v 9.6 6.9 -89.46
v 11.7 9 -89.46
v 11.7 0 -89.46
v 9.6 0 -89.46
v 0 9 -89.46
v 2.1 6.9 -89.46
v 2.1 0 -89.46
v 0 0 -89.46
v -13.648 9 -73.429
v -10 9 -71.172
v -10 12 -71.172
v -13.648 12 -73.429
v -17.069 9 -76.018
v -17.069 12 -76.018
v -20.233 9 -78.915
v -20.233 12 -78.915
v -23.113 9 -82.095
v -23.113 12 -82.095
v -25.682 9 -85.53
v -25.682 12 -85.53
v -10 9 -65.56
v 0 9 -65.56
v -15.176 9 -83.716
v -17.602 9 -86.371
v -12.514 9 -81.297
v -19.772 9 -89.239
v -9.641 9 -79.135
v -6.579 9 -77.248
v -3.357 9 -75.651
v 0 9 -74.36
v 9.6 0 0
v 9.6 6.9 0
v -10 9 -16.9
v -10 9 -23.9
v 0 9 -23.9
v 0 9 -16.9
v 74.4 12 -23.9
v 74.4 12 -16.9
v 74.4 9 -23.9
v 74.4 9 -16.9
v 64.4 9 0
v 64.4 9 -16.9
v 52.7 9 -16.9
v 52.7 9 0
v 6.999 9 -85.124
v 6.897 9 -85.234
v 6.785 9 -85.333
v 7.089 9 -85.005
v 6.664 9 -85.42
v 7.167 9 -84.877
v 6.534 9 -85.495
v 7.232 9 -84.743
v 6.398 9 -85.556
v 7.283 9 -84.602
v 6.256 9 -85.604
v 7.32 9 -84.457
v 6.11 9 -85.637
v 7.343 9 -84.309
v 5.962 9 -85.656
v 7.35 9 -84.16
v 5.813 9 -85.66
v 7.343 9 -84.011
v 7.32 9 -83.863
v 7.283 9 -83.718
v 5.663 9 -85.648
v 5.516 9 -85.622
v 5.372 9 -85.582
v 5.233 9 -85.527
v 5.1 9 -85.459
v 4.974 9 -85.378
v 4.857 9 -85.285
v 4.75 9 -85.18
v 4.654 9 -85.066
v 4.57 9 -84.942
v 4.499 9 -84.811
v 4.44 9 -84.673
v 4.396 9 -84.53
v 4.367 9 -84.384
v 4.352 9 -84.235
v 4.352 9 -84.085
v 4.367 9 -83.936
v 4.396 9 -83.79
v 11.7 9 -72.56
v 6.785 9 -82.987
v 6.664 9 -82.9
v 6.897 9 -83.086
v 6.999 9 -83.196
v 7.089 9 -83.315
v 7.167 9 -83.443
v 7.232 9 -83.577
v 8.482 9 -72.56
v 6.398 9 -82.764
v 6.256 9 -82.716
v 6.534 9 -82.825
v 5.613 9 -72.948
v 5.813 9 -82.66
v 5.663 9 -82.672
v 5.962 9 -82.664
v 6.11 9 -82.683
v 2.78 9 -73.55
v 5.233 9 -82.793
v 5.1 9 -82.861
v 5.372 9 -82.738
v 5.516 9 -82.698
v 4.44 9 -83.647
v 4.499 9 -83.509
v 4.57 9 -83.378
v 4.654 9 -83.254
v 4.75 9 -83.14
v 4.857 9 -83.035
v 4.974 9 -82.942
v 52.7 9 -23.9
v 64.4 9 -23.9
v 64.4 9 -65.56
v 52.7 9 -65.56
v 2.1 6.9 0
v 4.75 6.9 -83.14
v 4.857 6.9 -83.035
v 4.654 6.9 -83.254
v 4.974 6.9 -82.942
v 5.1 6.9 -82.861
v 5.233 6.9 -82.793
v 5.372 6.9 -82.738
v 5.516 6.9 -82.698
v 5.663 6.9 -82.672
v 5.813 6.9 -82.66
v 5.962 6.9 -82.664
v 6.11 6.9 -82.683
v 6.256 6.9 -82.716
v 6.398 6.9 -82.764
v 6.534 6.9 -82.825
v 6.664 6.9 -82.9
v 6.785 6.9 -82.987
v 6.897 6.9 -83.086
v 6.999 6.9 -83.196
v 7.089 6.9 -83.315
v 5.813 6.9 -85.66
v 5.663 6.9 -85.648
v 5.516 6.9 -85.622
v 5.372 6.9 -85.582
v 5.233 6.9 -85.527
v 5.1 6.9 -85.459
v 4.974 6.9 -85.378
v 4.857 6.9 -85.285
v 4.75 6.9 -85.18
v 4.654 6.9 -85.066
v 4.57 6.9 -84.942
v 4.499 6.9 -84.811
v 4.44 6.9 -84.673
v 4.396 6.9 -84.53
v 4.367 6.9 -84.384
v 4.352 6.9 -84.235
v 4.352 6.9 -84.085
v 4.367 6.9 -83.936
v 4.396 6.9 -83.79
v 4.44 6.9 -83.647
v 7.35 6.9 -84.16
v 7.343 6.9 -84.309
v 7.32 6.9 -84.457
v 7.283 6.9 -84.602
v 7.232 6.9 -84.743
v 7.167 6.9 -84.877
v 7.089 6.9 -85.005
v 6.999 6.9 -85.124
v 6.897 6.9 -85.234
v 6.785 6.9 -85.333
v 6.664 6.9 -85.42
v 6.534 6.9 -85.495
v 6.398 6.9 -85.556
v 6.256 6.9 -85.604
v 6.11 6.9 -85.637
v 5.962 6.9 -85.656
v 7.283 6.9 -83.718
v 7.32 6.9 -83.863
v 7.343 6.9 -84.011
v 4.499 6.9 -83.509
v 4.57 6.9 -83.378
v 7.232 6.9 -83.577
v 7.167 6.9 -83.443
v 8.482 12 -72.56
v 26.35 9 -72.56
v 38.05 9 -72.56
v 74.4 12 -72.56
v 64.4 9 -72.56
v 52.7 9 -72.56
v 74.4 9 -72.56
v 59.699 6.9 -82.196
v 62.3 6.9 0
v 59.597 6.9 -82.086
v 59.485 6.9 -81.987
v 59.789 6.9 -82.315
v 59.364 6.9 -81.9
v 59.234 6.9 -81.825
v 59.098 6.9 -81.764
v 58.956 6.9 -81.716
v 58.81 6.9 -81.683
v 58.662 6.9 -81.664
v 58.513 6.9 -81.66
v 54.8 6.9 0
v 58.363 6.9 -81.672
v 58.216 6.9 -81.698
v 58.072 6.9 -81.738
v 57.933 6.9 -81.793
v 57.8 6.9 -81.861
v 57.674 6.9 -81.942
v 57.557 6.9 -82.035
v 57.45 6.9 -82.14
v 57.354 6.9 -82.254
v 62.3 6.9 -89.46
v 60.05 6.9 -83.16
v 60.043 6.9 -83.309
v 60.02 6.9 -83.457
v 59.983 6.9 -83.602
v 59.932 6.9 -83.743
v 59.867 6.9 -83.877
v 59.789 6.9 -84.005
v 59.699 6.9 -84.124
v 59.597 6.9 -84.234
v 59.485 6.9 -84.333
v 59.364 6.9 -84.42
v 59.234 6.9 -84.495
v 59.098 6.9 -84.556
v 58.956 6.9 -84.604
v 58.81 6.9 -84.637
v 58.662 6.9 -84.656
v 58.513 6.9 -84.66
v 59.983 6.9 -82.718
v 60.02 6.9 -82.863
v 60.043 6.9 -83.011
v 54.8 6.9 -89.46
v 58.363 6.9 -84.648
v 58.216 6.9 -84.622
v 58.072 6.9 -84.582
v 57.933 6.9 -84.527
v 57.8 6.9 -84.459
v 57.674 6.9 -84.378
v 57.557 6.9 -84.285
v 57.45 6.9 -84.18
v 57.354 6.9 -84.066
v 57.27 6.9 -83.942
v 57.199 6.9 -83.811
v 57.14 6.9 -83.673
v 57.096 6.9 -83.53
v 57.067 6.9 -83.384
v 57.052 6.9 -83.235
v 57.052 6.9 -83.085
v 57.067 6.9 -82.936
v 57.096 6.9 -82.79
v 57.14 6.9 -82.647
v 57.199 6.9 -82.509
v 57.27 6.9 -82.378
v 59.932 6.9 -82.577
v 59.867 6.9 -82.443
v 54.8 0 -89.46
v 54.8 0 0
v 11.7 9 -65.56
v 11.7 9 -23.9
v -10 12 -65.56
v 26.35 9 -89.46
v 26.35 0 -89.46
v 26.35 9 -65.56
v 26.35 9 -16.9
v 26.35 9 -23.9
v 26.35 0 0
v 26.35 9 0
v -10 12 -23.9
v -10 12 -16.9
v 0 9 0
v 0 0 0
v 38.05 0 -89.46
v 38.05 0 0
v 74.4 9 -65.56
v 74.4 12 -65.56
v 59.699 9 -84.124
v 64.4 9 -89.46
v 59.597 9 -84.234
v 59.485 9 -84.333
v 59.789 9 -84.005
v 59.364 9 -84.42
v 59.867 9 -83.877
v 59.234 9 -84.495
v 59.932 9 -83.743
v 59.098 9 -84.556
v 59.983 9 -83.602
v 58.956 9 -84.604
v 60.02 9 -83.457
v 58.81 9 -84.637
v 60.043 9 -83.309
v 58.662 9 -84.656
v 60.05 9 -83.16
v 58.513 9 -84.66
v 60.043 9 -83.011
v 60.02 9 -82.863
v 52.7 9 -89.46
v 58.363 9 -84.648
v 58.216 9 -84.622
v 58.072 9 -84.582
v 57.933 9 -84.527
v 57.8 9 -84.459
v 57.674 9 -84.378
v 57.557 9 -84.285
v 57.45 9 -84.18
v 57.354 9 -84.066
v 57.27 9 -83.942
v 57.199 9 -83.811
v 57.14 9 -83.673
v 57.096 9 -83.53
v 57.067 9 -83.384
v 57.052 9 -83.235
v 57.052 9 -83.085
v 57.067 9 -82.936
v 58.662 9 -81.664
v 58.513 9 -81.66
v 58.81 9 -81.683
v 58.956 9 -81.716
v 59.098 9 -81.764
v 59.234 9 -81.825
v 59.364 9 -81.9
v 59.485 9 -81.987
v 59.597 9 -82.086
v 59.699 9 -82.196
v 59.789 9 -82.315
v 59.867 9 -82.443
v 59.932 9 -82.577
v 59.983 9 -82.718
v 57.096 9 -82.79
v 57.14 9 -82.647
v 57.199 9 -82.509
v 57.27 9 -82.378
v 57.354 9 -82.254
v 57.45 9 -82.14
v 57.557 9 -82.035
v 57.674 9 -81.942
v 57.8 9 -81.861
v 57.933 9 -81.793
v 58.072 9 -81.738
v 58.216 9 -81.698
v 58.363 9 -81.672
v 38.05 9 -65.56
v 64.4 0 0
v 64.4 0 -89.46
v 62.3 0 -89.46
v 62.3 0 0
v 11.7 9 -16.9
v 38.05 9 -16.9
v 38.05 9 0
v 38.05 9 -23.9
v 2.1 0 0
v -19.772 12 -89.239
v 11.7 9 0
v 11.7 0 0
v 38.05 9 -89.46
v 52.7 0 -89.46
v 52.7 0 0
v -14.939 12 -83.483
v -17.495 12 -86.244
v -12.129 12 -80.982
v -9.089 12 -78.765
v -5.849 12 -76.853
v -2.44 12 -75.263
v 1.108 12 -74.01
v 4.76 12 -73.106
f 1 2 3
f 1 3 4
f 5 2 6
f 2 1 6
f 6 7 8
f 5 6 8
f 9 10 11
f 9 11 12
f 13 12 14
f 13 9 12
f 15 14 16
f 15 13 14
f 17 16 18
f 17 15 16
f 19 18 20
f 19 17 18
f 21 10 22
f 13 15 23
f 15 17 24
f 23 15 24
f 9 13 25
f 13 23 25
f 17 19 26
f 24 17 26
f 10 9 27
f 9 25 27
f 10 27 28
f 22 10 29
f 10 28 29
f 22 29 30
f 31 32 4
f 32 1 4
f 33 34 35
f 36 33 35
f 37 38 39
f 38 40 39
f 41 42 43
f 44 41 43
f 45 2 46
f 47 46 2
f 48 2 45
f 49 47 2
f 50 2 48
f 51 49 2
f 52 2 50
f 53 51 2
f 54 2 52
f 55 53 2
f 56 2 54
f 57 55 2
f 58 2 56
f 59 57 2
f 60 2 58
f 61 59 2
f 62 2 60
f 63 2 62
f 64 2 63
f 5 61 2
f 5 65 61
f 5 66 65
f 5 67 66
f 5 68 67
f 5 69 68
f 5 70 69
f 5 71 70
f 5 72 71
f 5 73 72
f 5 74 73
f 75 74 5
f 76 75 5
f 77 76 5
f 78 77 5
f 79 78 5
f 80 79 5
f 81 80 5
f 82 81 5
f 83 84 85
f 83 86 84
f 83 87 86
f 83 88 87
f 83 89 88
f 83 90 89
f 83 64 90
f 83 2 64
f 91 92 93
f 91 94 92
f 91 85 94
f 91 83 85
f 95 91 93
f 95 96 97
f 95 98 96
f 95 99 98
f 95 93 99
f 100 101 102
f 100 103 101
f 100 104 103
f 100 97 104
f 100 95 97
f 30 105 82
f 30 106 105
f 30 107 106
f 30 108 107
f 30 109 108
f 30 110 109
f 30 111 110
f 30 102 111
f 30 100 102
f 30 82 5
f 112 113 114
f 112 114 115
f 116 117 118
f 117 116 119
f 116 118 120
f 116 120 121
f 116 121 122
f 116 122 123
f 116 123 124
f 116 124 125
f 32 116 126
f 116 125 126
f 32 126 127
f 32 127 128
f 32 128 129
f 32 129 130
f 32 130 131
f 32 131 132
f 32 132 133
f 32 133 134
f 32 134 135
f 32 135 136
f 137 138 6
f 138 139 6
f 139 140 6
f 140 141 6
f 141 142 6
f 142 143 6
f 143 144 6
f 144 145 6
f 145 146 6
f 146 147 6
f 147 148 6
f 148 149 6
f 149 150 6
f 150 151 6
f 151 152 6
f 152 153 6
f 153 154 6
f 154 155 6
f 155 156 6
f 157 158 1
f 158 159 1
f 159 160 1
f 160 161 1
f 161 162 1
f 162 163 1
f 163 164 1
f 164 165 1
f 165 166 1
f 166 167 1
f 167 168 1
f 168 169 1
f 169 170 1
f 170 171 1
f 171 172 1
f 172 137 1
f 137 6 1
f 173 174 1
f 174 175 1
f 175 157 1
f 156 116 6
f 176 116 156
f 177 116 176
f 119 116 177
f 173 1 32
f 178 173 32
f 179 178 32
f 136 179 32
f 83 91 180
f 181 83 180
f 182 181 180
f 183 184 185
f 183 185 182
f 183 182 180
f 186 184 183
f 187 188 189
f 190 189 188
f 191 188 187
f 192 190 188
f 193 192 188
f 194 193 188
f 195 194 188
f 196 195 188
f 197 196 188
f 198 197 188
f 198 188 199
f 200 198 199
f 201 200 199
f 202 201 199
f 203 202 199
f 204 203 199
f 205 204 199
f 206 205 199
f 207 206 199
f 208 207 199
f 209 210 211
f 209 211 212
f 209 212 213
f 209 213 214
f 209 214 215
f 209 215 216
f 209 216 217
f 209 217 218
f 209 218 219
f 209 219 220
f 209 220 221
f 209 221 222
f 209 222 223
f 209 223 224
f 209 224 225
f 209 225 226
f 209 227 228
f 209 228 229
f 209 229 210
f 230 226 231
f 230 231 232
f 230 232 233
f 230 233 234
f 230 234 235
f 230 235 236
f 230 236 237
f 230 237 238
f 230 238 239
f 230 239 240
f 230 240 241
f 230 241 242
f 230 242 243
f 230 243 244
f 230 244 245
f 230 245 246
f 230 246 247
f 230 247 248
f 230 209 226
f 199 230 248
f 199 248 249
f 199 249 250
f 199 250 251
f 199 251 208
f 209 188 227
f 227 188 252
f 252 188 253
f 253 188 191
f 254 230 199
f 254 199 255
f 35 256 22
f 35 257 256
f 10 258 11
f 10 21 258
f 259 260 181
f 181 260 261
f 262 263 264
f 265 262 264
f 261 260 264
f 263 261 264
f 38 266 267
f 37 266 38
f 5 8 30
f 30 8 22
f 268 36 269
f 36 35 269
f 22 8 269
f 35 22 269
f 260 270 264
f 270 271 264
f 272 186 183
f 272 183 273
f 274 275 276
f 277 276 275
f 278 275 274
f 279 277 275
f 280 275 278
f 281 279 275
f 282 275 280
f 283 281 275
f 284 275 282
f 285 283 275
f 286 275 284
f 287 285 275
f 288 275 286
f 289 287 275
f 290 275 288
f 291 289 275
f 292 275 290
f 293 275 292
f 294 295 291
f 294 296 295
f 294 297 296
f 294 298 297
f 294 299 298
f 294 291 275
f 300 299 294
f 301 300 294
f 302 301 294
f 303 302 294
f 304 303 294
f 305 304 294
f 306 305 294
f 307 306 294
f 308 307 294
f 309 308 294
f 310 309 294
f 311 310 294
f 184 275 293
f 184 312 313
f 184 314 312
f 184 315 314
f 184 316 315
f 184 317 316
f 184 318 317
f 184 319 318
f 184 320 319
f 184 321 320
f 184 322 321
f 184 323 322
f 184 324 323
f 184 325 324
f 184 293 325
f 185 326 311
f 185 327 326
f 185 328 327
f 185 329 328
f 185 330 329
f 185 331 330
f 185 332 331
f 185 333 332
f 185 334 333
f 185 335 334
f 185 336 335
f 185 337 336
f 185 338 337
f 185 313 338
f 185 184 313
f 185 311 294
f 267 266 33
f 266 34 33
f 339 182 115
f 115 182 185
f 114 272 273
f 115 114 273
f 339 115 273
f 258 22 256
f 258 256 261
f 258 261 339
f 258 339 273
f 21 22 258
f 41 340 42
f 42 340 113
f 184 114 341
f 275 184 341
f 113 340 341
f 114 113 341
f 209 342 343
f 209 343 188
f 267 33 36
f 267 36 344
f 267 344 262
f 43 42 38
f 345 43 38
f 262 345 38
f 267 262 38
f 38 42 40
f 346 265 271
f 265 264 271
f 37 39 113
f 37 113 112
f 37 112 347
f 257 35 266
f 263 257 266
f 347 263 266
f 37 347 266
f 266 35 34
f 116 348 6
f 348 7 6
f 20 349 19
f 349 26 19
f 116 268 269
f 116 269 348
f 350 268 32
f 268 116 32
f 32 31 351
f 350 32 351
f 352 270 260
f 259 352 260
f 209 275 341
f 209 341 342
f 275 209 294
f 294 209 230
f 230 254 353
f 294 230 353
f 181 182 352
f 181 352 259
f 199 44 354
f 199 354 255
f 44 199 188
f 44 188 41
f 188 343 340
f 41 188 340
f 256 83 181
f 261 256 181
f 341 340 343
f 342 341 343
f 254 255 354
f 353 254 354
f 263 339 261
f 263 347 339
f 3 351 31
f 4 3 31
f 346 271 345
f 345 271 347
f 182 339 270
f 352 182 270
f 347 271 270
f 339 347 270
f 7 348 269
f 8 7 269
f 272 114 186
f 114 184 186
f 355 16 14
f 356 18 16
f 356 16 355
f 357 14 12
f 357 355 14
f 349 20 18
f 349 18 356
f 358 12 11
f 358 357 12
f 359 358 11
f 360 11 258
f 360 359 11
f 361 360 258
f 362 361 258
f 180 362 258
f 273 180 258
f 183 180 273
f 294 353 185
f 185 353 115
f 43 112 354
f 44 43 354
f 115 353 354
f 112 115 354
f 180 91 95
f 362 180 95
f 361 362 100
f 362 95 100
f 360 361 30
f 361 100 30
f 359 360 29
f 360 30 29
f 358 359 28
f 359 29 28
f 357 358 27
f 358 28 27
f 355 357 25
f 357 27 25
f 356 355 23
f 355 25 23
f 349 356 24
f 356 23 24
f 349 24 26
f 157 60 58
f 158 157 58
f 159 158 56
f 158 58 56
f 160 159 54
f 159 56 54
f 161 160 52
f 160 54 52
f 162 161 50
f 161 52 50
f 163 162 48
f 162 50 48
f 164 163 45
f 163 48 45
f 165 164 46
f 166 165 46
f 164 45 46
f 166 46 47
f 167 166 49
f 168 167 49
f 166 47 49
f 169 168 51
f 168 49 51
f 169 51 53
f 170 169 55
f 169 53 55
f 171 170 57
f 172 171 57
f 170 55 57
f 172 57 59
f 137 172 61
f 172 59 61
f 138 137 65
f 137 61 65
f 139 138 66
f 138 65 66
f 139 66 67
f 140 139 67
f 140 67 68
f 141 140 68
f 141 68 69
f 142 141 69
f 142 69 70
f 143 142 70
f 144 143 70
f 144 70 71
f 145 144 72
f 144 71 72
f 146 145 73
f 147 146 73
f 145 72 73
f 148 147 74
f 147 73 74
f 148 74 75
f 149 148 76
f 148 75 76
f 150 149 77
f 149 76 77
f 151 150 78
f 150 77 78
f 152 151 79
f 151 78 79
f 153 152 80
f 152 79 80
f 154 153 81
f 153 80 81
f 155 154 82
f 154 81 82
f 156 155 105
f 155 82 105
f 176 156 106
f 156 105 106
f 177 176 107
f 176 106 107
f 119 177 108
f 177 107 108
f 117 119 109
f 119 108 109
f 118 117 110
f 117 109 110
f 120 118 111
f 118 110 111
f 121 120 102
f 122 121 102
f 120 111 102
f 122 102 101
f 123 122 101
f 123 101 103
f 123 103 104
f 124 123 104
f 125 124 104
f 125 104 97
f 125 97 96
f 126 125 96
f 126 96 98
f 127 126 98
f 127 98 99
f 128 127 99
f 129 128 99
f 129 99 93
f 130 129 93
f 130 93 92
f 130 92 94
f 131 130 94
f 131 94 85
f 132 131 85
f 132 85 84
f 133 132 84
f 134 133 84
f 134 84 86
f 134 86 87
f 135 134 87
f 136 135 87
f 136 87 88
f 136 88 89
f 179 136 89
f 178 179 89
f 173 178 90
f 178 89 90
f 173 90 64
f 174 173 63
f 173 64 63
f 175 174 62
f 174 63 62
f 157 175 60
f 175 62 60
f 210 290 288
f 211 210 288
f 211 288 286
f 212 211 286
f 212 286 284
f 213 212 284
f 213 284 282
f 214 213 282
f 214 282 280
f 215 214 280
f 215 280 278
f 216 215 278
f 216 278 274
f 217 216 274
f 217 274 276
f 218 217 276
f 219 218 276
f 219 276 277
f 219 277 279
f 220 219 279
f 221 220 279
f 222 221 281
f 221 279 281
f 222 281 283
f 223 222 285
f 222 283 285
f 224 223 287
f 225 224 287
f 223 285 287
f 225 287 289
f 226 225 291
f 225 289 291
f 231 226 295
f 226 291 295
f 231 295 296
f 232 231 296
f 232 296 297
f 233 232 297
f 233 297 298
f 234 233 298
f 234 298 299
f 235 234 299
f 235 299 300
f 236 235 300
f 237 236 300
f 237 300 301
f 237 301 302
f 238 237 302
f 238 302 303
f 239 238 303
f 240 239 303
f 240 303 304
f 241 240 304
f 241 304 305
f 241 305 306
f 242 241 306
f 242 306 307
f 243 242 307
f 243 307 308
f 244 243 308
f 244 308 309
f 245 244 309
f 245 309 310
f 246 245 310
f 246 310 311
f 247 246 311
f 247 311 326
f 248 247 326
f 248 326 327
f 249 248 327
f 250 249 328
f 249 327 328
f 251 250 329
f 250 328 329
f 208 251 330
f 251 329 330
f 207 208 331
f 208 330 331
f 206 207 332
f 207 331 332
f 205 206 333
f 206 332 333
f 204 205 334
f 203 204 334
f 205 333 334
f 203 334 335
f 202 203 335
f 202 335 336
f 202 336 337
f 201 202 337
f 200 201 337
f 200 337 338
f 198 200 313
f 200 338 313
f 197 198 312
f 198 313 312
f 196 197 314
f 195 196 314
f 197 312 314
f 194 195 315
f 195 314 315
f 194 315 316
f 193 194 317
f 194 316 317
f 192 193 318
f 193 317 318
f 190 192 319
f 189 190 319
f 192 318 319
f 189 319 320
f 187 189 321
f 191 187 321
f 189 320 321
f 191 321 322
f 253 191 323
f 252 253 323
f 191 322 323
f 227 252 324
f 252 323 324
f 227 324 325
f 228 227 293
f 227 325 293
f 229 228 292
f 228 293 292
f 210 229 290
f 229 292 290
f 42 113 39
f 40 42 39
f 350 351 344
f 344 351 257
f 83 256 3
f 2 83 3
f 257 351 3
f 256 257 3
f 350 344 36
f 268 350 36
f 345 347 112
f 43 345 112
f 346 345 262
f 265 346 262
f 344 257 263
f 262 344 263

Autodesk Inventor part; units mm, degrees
ref_plane "YZ Plane" through (0, 0, 0) normal (1, 0, 0) x (0, 1, 0)
ref_plane "XZ Plane" through (0, 0, 0) normal (0, 1, 0) x (-1, 0, 0)
sketch "Sketch1" plane through (0, 0, 0) normal (0, 1, 0) x (-1, 0, 0)
  line L0 (0, 0) -> (-11.7, 0)
  line L1 (-11.7, 0) -> (-11.7, -89.46)
  line L2 (-11.7, -89.46) -> (0, -89.46)
  line L3 (0, -89.46) -> (0, 0)
  line L4 (-26.35, 0) -> (-38.05, 0)
  line L5 (-38.05, 0) -> (-38.05, -89.46)
  line L6 (-38.05, -89.46) -> (-26.35, -89.46)
  line L7 (-26.35, -89.46) -> (-26.35, 0)
  line L8 (-52.7, 0) -> (-64.4, 0)
  line L9 (-64.4, 0) -> (-64.4, -89.46)
  line L10 (-64.4, -89.46) -> (-52.7, -89.46)
  line L11 (-52.7, -89.46) -> (-52.7, 0)
  dimension "d0" = 11.7
  dimension "d1" = 11.7
  dimension "d2" = 11.7
  dimension "d3" = 14.65
  dimension "d4" = 14.65
  dimension "d5" = 89.46
  dimension "d47" = 64.4
extrude "Extrusion1" add sketch "Sketch1" along normal blind 9
sketch "Sketch2" plane through (0, 9, 0) normal (0, 1, 0) x (1, 0, 0)
  line L0 (38.05, 89.46) -> (26.35, 89.46) construction
  line L1 (32.2, 89.46) -> (32.2, 0) construction
  line L2 (26.35, 0) -> (38.05, 0) construction
  line L3 (11.7, 89.46) -> (0, 89.46) construction
  line L4 (5.85, 89.46) -> (5.85, 0) construction
  line L5 (0, 0) -> (11.7, 0) construction
  circle A0 centre (5.85, 84.16) radius 1.5
  line L6 (52.7, 0) -> (64.4, 0) construction
  line L7 (58.55, 0) -> (58.55, 89.46) construction
  circle A1 centre (58.55, 83.16) radius 1.5
  line L8 (64.4, 89.46) -> (52.7, 89.46) construction
  dimension "d8" = 3
  dimension "d9" = 5.3
  dimension "d50" = 3
  dimension "d51" = 6.3
extrude "Extrusion2" cut sketch "Sketch2" against normal blind 8
sketch "Sketch3" plane through (11.7, 0, -89.46) normal (0, 0, -1) x (-1, 0, 0)
  line L0 (-14.65, 9) -> (-26.35, 9) construction
  line L1 (-20.5, 9) -> (-20.5, 0) construction
  line L2 (-14.65, 0) -> (-26.35, 0) construction
  line L3 (0, 0) -> (11.7, 0) projected
  line L4 (9.6, 0) -> (9.6, 6.9)
  line L5 (9.6, 6.9) -> (2.1, 6.9)
  line L6 (2.1, 6.9) -> (2.1, 0)
  line L7 (2.1, 0) -> (9.6, 0) construction
  line L8 (0, 0) -> (0, 9) construction
  line L9 (11.7, 0) -> (11.7, 9) construction
  line L10 (-41, 0) -> (-52.7, 0)
  line L11 (-50.6, 0) -> (-50.6, 6.9)
  line L12 (-50.6, 6.9) -> (-43.1, 6.9)
  line L13 (-43.1, 6.9) -> (-43.1, 0)
  dimension "d15" = 7.5
  dimension "d16" = 2.1
  dimension "d17" = 2.1
  dimension "d18" = 6.9
extrude "Extrusion3" cut sketch "Sketch3" against normal through all
sketch "Sketch4" plane through (0, 9, 0) normal (0, 1, 0) x (1, 0, 0)
  line L0 (0, 89.46) -> (0, 0) construction
  line L1 (0, 44.73) -> (64.4, 44.73) construction
  line L2 (64.4, 0) -> (64.4, 89.46) construction
  line L3 (-10, 16.9) -> (74.4, 16.9)
  line L4 (74.4, 16.9) -> (74.4, 23.9)
  line L5 (74.4, 23.9) -> (-10, 23.9)
  line L6 (-10, 23.9) -> (-10, 16.9)
  line L7 (-10, 72.56) -> (74.4, 72.56)
  line L8 (74.4, 72.56) -> (74.4, 65.56)
  line L9 (74.4, 65.56) -> (-10, 65.56)
  line L10 (-10, 65.56) -> (-10, 72.56)
  line L11 (52.7, 0) -> (64.4, 0) projected
  dimension "d21" = 7
  dimension "d22" = 10
  dimension "d23" = 10
  dimension "d46" = 16.9
extrude "Extrusion4" add sketch "Sketch4" along normal blind 3
ref_plane "Work Plane2" through (32.2, 0, -89.46) normal (-1, 0, 0) x (0, 0, 1)
sketch "Sketch8" plane through (0, 9, 0) normal (0, 1, 0) x (1, 0, 0)
  line L0 (74.4, 72.56) -> (-10, 72.56) projected
  line L1 (-10, 72.56) -> (-10, 65.56) projected
  line L2 (-10, 65.56) -> (74.4, 65.56) projected
  line L3 (74.4, 65.56) -> (74.4, 72.56) projected
  arc A0 (-19.9091, 89.4398) -> (8.4822, 72.56) centre (12.2544, 111.2215) ccw
  arc A1 (-25.6819, 85.5304) -> (8.4822, 65.56) centre (12.2544, 111.2215) ccw
  line L4 (8.4822, 65.56) -> (8.4822, 72.56)
  line L5 (9.6, 89.46) -> (9.6, 0) projected
  line L6 (-19.7721, 89.2387) -> (-25.6819, 85.5304)
  point P0 (0, 0)
extrude "Extrusion8" add sketch "Sketch8" along normal up to surface (3 mm away) contours L4 A1 L1 L0 | L0 L1 A1 L6 A0
ref_plane "Work Plane3" through (45.375, 0, 0) normal (1, 0, 0) x (0, 0, -1)
sketch "Sketch5" plane through (0, 8.5, 0) normal (0, -1, 0) x (1, 0, 0)
  line L0 (23, -75) -> (14, -75)
  line L1 (14, -75) -> (14, -22)
  line L2 (14, -22) -> (23, -22)
  line L3 (23, -22) -> (23, -75)
  line L4 (26, -90) -> (26, 0) projected
  line L5 (11, 0) -> (11, -90) projected
  line L6 (11, -22) -> (26, -22) projected
  line L7 (11, -68) -> (26, -68) projected
  point P0 (0, 0)
  point P1 (18.5, -22)
  dimension "d27" = 3
  dimension "d28" = 3
  dimension "d29" = 9
  dimension "d30" = 7
sketch "Sketch6" plane through (23, 8.5, -75) normal (0, 0, -1) x (-1, 0, 0)
  line L0 (9, 0) -> (9, -2) projected
  line L1 (0, 0) -> (0, -2) projected
  line L2 (9, -0.5) -> (0, -0.5)
  line L3 (0, -0.5) -> (0, -1.5)
  line L4 (0, -1.5) -> (9, -1.5)
  line L5 (9, -1.5) -> (9, -0.5)
  line L6 (9, 0) -> (0, 0) projected
  line L7 (9, -2) -> (0, -2) projected
  point P0 (23, -8.5)
  dimension "d34" = 0.5
  dimension "d35" = 0.5
  dimension "d36" = 1
sketch "Sketch7" plane through (14, 8, -75) normal (0, 1, 0) x (1, 0, 0)
  line L0 (1.5, 2) -> (7.5, 2)
  line L1 (7.5, 2) -> (7.5, 4.5)
  line L2 (7.5, 4.5) -> (1.5, 4.5)
  line L3 (1.5, 4.5) -> (1.5, 2)
  line L4 (0, 0) -> (0, 7) projected
  line L5 (9, 0) -> (9, 7) projected
  line L6 (0, 7) -> (9, 7) projected
  point P0 (-14, -75)
  dimension "d39" = 6
  dimension "d40" = 2.5
  dimension "d41" = 1.5
  dimension "d42" = 1.5
  dimension "d43" = 2.5
equation "\"d1\" = d0"
equation "\"d2\" = d1"
equation "\"d4\" = d3"
equation "\"d17\" = d16"
equation "\"d23\" = d22"
equation "\"d28\" = d27"
equation "\"d35\" = d34"
equation "\"d42\" = d41"
properties part number "tracks"
